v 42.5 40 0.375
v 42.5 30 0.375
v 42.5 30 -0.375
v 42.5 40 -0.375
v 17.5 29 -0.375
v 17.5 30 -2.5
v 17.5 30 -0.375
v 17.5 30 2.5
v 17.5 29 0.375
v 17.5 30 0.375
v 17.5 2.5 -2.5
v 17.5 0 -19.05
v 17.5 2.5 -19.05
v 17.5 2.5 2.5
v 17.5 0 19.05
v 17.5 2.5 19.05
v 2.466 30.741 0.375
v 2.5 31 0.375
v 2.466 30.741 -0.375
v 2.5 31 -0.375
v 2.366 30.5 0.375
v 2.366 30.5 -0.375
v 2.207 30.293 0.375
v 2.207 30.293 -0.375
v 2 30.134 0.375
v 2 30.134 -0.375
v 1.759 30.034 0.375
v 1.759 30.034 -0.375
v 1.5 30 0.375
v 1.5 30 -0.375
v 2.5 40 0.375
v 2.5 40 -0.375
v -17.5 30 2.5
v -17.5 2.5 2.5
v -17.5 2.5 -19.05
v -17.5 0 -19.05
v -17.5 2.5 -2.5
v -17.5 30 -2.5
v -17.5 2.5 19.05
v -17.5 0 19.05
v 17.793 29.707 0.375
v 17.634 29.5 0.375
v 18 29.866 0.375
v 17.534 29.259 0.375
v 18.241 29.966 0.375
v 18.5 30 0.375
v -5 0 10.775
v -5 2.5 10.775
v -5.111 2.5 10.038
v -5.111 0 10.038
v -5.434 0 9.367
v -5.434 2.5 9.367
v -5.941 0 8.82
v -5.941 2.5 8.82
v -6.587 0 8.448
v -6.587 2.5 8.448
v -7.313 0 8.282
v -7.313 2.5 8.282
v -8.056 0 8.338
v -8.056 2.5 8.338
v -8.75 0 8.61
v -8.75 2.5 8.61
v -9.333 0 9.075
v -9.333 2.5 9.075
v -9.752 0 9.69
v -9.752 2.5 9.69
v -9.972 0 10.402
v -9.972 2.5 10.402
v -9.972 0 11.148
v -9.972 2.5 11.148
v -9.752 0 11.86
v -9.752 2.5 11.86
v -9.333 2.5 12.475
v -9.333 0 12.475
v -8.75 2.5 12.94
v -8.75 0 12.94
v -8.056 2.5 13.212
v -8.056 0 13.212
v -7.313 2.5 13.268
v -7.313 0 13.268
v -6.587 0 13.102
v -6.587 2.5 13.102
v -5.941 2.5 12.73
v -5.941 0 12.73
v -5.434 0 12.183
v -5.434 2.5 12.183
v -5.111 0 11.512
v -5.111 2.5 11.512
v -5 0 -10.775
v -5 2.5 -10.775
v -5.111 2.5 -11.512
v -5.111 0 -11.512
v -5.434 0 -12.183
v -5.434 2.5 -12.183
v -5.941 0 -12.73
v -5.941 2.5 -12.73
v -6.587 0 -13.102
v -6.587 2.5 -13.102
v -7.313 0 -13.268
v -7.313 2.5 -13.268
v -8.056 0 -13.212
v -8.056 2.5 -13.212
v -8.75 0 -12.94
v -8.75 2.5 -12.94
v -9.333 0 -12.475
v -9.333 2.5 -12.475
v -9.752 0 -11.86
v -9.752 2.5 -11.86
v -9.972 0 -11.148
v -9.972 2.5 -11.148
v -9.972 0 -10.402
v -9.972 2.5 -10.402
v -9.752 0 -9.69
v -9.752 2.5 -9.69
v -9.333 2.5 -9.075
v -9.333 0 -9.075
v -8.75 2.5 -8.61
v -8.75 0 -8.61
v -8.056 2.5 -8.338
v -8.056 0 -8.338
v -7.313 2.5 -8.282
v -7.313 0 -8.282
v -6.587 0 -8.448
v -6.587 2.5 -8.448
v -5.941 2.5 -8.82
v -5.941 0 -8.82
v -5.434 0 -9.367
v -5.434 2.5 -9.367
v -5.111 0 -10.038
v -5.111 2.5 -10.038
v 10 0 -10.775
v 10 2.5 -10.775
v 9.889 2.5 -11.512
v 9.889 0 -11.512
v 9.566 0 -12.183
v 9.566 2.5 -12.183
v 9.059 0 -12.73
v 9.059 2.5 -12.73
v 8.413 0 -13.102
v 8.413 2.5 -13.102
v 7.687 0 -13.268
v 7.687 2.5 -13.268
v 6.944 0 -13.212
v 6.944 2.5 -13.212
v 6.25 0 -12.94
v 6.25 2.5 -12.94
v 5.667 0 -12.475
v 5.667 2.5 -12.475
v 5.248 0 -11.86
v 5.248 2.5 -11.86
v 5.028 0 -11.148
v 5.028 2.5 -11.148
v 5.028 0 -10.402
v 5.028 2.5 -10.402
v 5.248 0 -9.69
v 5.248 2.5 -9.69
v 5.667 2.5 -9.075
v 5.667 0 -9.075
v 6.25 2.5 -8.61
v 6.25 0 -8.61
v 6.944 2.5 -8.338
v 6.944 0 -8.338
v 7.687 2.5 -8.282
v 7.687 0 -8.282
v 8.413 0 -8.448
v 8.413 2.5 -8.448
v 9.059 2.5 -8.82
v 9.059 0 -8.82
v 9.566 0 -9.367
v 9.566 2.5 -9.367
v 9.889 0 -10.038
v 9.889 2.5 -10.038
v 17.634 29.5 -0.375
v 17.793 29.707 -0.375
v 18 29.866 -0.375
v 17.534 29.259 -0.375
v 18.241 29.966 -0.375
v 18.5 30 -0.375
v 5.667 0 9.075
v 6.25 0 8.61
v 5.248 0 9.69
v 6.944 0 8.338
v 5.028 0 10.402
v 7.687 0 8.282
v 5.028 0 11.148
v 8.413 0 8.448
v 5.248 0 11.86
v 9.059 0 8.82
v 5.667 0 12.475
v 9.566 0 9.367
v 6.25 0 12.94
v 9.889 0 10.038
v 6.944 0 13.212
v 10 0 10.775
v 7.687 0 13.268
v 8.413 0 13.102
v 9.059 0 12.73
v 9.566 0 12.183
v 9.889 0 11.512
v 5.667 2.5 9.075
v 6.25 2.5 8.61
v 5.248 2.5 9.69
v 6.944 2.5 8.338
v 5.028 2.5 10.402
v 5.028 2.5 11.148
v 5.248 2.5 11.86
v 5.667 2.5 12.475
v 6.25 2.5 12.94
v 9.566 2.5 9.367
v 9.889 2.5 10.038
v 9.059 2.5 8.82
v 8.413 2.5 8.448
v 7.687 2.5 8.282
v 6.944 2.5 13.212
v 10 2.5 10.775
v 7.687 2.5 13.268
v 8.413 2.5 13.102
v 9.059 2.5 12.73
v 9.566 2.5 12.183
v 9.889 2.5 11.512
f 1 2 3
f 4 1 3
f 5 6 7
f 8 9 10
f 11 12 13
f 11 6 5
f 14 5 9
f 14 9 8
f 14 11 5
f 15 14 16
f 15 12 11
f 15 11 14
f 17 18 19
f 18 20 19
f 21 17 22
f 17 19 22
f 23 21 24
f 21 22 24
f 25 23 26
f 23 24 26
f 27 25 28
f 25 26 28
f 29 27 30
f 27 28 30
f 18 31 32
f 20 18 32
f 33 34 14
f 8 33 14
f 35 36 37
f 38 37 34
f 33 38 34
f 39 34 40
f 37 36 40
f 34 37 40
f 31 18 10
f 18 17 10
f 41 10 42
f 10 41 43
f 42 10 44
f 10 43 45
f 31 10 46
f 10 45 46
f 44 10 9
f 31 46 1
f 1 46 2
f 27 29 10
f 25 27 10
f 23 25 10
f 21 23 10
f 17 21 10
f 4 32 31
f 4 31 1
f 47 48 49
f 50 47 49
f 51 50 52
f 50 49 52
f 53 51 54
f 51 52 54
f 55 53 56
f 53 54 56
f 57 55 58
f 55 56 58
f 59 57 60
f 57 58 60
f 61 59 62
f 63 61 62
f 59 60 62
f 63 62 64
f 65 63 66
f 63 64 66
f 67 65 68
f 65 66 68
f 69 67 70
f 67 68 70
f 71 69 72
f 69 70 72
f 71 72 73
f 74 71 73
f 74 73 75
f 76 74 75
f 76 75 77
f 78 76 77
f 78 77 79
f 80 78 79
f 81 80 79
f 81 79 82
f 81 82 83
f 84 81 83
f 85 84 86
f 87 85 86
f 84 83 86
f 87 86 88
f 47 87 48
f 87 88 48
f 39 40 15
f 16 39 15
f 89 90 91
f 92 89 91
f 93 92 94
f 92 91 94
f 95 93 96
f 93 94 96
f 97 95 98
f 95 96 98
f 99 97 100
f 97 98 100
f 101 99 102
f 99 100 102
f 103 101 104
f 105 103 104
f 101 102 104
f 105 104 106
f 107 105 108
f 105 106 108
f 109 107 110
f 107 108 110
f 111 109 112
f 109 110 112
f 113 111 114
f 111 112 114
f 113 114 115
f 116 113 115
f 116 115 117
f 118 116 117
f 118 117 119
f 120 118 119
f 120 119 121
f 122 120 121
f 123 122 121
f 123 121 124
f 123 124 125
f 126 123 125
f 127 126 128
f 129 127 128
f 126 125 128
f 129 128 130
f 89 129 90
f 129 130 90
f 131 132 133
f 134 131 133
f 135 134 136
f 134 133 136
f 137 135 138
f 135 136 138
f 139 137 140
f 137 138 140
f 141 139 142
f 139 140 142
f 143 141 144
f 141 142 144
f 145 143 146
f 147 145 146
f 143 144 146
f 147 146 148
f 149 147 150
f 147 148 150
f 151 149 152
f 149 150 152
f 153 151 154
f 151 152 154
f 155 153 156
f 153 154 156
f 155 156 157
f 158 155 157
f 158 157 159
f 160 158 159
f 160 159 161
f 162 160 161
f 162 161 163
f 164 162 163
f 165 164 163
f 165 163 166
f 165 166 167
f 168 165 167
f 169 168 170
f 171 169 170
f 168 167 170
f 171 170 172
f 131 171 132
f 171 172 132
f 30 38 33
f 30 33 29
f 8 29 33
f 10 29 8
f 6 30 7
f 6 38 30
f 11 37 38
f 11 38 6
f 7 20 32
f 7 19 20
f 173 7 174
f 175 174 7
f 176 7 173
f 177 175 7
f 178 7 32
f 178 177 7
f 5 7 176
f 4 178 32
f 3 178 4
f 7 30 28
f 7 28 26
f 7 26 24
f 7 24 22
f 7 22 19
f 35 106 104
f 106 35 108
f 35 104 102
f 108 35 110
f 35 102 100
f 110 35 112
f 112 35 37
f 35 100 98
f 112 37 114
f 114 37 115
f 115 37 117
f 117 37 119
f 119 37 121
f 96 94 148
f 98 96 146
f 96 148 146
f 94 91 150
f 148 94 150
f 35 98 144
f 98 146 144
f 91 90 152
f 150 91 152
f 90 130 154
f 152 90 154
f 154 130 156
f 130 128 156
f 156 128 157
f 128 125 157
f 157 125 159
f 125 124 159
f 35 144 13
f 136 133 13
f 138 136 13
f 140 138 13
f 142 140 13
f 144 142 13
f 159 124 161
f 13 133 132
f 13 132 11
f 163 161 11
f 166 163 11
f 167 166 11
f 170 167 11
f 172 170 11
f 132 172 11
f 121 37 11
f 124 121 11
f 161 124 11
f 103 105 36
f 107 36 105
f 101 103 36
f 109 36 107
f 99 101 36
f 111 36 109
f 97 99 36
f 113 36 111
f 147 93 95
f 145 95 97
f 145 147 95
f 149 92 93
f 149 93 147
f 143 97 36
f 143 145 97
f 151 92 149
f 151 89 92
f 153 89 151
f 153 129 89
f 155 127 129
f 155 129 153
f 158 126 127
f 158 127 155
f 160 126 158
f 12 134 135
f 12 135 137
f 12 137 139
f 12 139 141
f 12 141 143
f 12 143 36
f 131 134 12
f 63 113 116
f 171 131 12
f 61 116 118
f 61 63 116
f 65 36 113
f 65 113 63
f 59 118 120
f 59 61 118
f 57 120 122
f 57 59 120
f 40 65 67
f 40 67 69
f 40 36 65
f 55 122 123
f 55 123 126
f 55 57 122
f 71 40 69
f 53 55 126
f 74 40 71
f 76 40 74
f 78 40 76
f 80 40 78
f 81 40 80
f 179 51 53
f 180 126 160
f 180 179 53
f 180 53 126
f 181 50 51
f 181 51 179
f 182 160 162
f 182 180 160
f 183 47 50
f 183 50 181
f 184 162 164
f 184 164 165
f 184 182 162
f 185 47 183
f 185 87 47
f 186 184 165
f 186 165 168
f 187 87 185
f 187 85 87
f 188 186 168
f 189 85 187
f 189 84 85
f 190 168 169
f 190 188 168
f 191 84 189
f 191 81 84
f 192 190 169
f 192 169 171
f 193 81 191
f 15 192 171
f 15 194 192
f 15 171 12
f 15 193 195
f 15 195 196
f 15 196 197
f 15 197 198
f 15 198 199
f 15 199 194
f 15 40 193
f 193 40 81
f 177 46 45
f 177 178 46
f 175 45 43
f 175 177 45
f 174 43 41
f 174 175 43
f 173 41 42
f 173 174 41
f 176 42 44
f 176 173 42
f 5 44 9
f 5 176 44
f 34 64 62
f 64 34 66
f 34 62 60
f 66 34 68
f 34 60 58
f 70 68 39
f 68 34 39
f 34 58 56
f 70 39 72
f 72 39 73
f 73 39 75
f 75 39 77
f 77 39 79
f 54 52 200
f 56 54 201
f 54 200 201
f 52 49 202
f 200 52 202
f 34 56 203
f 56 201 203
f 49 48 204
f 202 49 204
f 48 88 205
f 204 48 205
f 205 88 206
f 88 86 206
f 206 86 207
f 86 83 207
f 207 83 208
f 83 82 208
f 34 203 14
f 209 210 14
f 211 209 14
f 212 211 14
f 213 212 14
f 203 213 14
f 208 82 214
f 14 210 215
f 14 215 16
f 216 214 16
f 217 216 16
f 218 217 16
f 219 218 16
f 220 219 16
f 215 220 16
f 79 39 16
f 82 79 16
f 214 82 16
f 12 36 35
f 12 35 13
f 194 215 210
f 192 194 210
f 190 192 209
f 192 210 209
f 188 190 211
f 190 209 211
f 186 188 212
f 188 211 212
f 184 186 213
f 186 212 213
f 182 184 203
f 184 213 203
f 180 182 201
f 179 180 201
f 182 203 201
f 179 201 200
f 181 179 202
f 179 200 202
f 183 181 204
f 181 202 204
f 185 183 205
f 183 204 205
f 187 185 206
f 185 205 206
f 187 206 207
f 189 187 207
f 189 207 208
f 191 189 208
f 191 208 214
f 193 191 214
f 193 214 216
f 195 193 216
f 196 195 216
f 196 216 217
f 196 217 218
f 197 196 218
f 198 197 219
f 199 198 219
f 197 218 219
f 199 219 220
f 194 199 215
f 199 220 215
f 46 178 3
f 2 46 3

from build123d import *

# Parameters (mm, degrees)
ESQUISSE1_W             = 35
ESQUISSE1_H             = 5
BOSS_EXTRU_1_DEPTH      = 30
ESQUISSE2_W             = 40
ESQUISSE2_H             = 0.75
BOSS_EXTRU_2_DEPTH      = 10
CONG_1_R                = 1
ESQUISSE3_W             = 35
ESQUISSE3_H             = 38.1
BOSS_EXTRU_3_DEPTH      = 2.5
ESQUISSE4_R             = 2.5
ENL_V_MAT_EXTRU_1_DEPTH = 2.5


with BuildPart() as part:
    # Esquisse1 → Boss.-Extru.1 (new body)
    with BuildSketch(Plane(origin=(0, 0, 0), x_dir=(1, 0, 0), z_dir=(0, 1, 0))):
        Rectangle(ESQUISSE1_W, ESQUISSE1_H)
    extrude(amount=BOSS_EXTRU_1_DEPTH)

    # Esquisse2 → Boss.-Extru.2 (add)
    with BuildSketch(Plane(origin=(0, 30, 0), x_dir=(1, 0, 0), z_dir=(0, 1, 0))):
        with Locations((22.5, 0)):
            Rectangle(ESQUISSE2_W, ESQUISSE2_H)
    extrude(amount=BOSS_EXTRU_2_DEPTH)

    # Congé1
    cong_1_edges = [part.edges().sort_by_distance(p)[0] for p in [
        (17.5, 30, 0),
        (2.5, 30, 0),
    ]]
    fillet(cong_1_edges, radius=CONG_1_R)

    # Esquisse3 → Boss.-Extru.3 (add)
    with BuildSketch(Plane.XZ):
        Rectangle(ESQUISSE3_W, ESQUISSE3_H)
    extrude(amount=-BOSS_EXTRU_3_DEPTH)

    # Esquisse4 → Enlèv. mat.-Extru.1 (cut)
    with BuildSketch(Plane(origin=(0, 2.5, 0), x_dir=(1, 0, 0), z_dir=(0, 1, 0))):
        with Locations((-7.5, 10.775)):
            Circle(ESQUISSE4_R)
        with Locations((7.5, 10.775)):
            Circle(ESQUISSE4_R)
        with Locations((7.5, -10.775)):
            Circle(ESQUISSE4_R)
        with Locations((-7.5, -10.775)):
            Circle(ESQUISSE4_R)
    extrude(amount=-ENL_V_MAT_EXTRU_1_DEPTH, mode=Mode.SUBTRACT)


solid = part.part
